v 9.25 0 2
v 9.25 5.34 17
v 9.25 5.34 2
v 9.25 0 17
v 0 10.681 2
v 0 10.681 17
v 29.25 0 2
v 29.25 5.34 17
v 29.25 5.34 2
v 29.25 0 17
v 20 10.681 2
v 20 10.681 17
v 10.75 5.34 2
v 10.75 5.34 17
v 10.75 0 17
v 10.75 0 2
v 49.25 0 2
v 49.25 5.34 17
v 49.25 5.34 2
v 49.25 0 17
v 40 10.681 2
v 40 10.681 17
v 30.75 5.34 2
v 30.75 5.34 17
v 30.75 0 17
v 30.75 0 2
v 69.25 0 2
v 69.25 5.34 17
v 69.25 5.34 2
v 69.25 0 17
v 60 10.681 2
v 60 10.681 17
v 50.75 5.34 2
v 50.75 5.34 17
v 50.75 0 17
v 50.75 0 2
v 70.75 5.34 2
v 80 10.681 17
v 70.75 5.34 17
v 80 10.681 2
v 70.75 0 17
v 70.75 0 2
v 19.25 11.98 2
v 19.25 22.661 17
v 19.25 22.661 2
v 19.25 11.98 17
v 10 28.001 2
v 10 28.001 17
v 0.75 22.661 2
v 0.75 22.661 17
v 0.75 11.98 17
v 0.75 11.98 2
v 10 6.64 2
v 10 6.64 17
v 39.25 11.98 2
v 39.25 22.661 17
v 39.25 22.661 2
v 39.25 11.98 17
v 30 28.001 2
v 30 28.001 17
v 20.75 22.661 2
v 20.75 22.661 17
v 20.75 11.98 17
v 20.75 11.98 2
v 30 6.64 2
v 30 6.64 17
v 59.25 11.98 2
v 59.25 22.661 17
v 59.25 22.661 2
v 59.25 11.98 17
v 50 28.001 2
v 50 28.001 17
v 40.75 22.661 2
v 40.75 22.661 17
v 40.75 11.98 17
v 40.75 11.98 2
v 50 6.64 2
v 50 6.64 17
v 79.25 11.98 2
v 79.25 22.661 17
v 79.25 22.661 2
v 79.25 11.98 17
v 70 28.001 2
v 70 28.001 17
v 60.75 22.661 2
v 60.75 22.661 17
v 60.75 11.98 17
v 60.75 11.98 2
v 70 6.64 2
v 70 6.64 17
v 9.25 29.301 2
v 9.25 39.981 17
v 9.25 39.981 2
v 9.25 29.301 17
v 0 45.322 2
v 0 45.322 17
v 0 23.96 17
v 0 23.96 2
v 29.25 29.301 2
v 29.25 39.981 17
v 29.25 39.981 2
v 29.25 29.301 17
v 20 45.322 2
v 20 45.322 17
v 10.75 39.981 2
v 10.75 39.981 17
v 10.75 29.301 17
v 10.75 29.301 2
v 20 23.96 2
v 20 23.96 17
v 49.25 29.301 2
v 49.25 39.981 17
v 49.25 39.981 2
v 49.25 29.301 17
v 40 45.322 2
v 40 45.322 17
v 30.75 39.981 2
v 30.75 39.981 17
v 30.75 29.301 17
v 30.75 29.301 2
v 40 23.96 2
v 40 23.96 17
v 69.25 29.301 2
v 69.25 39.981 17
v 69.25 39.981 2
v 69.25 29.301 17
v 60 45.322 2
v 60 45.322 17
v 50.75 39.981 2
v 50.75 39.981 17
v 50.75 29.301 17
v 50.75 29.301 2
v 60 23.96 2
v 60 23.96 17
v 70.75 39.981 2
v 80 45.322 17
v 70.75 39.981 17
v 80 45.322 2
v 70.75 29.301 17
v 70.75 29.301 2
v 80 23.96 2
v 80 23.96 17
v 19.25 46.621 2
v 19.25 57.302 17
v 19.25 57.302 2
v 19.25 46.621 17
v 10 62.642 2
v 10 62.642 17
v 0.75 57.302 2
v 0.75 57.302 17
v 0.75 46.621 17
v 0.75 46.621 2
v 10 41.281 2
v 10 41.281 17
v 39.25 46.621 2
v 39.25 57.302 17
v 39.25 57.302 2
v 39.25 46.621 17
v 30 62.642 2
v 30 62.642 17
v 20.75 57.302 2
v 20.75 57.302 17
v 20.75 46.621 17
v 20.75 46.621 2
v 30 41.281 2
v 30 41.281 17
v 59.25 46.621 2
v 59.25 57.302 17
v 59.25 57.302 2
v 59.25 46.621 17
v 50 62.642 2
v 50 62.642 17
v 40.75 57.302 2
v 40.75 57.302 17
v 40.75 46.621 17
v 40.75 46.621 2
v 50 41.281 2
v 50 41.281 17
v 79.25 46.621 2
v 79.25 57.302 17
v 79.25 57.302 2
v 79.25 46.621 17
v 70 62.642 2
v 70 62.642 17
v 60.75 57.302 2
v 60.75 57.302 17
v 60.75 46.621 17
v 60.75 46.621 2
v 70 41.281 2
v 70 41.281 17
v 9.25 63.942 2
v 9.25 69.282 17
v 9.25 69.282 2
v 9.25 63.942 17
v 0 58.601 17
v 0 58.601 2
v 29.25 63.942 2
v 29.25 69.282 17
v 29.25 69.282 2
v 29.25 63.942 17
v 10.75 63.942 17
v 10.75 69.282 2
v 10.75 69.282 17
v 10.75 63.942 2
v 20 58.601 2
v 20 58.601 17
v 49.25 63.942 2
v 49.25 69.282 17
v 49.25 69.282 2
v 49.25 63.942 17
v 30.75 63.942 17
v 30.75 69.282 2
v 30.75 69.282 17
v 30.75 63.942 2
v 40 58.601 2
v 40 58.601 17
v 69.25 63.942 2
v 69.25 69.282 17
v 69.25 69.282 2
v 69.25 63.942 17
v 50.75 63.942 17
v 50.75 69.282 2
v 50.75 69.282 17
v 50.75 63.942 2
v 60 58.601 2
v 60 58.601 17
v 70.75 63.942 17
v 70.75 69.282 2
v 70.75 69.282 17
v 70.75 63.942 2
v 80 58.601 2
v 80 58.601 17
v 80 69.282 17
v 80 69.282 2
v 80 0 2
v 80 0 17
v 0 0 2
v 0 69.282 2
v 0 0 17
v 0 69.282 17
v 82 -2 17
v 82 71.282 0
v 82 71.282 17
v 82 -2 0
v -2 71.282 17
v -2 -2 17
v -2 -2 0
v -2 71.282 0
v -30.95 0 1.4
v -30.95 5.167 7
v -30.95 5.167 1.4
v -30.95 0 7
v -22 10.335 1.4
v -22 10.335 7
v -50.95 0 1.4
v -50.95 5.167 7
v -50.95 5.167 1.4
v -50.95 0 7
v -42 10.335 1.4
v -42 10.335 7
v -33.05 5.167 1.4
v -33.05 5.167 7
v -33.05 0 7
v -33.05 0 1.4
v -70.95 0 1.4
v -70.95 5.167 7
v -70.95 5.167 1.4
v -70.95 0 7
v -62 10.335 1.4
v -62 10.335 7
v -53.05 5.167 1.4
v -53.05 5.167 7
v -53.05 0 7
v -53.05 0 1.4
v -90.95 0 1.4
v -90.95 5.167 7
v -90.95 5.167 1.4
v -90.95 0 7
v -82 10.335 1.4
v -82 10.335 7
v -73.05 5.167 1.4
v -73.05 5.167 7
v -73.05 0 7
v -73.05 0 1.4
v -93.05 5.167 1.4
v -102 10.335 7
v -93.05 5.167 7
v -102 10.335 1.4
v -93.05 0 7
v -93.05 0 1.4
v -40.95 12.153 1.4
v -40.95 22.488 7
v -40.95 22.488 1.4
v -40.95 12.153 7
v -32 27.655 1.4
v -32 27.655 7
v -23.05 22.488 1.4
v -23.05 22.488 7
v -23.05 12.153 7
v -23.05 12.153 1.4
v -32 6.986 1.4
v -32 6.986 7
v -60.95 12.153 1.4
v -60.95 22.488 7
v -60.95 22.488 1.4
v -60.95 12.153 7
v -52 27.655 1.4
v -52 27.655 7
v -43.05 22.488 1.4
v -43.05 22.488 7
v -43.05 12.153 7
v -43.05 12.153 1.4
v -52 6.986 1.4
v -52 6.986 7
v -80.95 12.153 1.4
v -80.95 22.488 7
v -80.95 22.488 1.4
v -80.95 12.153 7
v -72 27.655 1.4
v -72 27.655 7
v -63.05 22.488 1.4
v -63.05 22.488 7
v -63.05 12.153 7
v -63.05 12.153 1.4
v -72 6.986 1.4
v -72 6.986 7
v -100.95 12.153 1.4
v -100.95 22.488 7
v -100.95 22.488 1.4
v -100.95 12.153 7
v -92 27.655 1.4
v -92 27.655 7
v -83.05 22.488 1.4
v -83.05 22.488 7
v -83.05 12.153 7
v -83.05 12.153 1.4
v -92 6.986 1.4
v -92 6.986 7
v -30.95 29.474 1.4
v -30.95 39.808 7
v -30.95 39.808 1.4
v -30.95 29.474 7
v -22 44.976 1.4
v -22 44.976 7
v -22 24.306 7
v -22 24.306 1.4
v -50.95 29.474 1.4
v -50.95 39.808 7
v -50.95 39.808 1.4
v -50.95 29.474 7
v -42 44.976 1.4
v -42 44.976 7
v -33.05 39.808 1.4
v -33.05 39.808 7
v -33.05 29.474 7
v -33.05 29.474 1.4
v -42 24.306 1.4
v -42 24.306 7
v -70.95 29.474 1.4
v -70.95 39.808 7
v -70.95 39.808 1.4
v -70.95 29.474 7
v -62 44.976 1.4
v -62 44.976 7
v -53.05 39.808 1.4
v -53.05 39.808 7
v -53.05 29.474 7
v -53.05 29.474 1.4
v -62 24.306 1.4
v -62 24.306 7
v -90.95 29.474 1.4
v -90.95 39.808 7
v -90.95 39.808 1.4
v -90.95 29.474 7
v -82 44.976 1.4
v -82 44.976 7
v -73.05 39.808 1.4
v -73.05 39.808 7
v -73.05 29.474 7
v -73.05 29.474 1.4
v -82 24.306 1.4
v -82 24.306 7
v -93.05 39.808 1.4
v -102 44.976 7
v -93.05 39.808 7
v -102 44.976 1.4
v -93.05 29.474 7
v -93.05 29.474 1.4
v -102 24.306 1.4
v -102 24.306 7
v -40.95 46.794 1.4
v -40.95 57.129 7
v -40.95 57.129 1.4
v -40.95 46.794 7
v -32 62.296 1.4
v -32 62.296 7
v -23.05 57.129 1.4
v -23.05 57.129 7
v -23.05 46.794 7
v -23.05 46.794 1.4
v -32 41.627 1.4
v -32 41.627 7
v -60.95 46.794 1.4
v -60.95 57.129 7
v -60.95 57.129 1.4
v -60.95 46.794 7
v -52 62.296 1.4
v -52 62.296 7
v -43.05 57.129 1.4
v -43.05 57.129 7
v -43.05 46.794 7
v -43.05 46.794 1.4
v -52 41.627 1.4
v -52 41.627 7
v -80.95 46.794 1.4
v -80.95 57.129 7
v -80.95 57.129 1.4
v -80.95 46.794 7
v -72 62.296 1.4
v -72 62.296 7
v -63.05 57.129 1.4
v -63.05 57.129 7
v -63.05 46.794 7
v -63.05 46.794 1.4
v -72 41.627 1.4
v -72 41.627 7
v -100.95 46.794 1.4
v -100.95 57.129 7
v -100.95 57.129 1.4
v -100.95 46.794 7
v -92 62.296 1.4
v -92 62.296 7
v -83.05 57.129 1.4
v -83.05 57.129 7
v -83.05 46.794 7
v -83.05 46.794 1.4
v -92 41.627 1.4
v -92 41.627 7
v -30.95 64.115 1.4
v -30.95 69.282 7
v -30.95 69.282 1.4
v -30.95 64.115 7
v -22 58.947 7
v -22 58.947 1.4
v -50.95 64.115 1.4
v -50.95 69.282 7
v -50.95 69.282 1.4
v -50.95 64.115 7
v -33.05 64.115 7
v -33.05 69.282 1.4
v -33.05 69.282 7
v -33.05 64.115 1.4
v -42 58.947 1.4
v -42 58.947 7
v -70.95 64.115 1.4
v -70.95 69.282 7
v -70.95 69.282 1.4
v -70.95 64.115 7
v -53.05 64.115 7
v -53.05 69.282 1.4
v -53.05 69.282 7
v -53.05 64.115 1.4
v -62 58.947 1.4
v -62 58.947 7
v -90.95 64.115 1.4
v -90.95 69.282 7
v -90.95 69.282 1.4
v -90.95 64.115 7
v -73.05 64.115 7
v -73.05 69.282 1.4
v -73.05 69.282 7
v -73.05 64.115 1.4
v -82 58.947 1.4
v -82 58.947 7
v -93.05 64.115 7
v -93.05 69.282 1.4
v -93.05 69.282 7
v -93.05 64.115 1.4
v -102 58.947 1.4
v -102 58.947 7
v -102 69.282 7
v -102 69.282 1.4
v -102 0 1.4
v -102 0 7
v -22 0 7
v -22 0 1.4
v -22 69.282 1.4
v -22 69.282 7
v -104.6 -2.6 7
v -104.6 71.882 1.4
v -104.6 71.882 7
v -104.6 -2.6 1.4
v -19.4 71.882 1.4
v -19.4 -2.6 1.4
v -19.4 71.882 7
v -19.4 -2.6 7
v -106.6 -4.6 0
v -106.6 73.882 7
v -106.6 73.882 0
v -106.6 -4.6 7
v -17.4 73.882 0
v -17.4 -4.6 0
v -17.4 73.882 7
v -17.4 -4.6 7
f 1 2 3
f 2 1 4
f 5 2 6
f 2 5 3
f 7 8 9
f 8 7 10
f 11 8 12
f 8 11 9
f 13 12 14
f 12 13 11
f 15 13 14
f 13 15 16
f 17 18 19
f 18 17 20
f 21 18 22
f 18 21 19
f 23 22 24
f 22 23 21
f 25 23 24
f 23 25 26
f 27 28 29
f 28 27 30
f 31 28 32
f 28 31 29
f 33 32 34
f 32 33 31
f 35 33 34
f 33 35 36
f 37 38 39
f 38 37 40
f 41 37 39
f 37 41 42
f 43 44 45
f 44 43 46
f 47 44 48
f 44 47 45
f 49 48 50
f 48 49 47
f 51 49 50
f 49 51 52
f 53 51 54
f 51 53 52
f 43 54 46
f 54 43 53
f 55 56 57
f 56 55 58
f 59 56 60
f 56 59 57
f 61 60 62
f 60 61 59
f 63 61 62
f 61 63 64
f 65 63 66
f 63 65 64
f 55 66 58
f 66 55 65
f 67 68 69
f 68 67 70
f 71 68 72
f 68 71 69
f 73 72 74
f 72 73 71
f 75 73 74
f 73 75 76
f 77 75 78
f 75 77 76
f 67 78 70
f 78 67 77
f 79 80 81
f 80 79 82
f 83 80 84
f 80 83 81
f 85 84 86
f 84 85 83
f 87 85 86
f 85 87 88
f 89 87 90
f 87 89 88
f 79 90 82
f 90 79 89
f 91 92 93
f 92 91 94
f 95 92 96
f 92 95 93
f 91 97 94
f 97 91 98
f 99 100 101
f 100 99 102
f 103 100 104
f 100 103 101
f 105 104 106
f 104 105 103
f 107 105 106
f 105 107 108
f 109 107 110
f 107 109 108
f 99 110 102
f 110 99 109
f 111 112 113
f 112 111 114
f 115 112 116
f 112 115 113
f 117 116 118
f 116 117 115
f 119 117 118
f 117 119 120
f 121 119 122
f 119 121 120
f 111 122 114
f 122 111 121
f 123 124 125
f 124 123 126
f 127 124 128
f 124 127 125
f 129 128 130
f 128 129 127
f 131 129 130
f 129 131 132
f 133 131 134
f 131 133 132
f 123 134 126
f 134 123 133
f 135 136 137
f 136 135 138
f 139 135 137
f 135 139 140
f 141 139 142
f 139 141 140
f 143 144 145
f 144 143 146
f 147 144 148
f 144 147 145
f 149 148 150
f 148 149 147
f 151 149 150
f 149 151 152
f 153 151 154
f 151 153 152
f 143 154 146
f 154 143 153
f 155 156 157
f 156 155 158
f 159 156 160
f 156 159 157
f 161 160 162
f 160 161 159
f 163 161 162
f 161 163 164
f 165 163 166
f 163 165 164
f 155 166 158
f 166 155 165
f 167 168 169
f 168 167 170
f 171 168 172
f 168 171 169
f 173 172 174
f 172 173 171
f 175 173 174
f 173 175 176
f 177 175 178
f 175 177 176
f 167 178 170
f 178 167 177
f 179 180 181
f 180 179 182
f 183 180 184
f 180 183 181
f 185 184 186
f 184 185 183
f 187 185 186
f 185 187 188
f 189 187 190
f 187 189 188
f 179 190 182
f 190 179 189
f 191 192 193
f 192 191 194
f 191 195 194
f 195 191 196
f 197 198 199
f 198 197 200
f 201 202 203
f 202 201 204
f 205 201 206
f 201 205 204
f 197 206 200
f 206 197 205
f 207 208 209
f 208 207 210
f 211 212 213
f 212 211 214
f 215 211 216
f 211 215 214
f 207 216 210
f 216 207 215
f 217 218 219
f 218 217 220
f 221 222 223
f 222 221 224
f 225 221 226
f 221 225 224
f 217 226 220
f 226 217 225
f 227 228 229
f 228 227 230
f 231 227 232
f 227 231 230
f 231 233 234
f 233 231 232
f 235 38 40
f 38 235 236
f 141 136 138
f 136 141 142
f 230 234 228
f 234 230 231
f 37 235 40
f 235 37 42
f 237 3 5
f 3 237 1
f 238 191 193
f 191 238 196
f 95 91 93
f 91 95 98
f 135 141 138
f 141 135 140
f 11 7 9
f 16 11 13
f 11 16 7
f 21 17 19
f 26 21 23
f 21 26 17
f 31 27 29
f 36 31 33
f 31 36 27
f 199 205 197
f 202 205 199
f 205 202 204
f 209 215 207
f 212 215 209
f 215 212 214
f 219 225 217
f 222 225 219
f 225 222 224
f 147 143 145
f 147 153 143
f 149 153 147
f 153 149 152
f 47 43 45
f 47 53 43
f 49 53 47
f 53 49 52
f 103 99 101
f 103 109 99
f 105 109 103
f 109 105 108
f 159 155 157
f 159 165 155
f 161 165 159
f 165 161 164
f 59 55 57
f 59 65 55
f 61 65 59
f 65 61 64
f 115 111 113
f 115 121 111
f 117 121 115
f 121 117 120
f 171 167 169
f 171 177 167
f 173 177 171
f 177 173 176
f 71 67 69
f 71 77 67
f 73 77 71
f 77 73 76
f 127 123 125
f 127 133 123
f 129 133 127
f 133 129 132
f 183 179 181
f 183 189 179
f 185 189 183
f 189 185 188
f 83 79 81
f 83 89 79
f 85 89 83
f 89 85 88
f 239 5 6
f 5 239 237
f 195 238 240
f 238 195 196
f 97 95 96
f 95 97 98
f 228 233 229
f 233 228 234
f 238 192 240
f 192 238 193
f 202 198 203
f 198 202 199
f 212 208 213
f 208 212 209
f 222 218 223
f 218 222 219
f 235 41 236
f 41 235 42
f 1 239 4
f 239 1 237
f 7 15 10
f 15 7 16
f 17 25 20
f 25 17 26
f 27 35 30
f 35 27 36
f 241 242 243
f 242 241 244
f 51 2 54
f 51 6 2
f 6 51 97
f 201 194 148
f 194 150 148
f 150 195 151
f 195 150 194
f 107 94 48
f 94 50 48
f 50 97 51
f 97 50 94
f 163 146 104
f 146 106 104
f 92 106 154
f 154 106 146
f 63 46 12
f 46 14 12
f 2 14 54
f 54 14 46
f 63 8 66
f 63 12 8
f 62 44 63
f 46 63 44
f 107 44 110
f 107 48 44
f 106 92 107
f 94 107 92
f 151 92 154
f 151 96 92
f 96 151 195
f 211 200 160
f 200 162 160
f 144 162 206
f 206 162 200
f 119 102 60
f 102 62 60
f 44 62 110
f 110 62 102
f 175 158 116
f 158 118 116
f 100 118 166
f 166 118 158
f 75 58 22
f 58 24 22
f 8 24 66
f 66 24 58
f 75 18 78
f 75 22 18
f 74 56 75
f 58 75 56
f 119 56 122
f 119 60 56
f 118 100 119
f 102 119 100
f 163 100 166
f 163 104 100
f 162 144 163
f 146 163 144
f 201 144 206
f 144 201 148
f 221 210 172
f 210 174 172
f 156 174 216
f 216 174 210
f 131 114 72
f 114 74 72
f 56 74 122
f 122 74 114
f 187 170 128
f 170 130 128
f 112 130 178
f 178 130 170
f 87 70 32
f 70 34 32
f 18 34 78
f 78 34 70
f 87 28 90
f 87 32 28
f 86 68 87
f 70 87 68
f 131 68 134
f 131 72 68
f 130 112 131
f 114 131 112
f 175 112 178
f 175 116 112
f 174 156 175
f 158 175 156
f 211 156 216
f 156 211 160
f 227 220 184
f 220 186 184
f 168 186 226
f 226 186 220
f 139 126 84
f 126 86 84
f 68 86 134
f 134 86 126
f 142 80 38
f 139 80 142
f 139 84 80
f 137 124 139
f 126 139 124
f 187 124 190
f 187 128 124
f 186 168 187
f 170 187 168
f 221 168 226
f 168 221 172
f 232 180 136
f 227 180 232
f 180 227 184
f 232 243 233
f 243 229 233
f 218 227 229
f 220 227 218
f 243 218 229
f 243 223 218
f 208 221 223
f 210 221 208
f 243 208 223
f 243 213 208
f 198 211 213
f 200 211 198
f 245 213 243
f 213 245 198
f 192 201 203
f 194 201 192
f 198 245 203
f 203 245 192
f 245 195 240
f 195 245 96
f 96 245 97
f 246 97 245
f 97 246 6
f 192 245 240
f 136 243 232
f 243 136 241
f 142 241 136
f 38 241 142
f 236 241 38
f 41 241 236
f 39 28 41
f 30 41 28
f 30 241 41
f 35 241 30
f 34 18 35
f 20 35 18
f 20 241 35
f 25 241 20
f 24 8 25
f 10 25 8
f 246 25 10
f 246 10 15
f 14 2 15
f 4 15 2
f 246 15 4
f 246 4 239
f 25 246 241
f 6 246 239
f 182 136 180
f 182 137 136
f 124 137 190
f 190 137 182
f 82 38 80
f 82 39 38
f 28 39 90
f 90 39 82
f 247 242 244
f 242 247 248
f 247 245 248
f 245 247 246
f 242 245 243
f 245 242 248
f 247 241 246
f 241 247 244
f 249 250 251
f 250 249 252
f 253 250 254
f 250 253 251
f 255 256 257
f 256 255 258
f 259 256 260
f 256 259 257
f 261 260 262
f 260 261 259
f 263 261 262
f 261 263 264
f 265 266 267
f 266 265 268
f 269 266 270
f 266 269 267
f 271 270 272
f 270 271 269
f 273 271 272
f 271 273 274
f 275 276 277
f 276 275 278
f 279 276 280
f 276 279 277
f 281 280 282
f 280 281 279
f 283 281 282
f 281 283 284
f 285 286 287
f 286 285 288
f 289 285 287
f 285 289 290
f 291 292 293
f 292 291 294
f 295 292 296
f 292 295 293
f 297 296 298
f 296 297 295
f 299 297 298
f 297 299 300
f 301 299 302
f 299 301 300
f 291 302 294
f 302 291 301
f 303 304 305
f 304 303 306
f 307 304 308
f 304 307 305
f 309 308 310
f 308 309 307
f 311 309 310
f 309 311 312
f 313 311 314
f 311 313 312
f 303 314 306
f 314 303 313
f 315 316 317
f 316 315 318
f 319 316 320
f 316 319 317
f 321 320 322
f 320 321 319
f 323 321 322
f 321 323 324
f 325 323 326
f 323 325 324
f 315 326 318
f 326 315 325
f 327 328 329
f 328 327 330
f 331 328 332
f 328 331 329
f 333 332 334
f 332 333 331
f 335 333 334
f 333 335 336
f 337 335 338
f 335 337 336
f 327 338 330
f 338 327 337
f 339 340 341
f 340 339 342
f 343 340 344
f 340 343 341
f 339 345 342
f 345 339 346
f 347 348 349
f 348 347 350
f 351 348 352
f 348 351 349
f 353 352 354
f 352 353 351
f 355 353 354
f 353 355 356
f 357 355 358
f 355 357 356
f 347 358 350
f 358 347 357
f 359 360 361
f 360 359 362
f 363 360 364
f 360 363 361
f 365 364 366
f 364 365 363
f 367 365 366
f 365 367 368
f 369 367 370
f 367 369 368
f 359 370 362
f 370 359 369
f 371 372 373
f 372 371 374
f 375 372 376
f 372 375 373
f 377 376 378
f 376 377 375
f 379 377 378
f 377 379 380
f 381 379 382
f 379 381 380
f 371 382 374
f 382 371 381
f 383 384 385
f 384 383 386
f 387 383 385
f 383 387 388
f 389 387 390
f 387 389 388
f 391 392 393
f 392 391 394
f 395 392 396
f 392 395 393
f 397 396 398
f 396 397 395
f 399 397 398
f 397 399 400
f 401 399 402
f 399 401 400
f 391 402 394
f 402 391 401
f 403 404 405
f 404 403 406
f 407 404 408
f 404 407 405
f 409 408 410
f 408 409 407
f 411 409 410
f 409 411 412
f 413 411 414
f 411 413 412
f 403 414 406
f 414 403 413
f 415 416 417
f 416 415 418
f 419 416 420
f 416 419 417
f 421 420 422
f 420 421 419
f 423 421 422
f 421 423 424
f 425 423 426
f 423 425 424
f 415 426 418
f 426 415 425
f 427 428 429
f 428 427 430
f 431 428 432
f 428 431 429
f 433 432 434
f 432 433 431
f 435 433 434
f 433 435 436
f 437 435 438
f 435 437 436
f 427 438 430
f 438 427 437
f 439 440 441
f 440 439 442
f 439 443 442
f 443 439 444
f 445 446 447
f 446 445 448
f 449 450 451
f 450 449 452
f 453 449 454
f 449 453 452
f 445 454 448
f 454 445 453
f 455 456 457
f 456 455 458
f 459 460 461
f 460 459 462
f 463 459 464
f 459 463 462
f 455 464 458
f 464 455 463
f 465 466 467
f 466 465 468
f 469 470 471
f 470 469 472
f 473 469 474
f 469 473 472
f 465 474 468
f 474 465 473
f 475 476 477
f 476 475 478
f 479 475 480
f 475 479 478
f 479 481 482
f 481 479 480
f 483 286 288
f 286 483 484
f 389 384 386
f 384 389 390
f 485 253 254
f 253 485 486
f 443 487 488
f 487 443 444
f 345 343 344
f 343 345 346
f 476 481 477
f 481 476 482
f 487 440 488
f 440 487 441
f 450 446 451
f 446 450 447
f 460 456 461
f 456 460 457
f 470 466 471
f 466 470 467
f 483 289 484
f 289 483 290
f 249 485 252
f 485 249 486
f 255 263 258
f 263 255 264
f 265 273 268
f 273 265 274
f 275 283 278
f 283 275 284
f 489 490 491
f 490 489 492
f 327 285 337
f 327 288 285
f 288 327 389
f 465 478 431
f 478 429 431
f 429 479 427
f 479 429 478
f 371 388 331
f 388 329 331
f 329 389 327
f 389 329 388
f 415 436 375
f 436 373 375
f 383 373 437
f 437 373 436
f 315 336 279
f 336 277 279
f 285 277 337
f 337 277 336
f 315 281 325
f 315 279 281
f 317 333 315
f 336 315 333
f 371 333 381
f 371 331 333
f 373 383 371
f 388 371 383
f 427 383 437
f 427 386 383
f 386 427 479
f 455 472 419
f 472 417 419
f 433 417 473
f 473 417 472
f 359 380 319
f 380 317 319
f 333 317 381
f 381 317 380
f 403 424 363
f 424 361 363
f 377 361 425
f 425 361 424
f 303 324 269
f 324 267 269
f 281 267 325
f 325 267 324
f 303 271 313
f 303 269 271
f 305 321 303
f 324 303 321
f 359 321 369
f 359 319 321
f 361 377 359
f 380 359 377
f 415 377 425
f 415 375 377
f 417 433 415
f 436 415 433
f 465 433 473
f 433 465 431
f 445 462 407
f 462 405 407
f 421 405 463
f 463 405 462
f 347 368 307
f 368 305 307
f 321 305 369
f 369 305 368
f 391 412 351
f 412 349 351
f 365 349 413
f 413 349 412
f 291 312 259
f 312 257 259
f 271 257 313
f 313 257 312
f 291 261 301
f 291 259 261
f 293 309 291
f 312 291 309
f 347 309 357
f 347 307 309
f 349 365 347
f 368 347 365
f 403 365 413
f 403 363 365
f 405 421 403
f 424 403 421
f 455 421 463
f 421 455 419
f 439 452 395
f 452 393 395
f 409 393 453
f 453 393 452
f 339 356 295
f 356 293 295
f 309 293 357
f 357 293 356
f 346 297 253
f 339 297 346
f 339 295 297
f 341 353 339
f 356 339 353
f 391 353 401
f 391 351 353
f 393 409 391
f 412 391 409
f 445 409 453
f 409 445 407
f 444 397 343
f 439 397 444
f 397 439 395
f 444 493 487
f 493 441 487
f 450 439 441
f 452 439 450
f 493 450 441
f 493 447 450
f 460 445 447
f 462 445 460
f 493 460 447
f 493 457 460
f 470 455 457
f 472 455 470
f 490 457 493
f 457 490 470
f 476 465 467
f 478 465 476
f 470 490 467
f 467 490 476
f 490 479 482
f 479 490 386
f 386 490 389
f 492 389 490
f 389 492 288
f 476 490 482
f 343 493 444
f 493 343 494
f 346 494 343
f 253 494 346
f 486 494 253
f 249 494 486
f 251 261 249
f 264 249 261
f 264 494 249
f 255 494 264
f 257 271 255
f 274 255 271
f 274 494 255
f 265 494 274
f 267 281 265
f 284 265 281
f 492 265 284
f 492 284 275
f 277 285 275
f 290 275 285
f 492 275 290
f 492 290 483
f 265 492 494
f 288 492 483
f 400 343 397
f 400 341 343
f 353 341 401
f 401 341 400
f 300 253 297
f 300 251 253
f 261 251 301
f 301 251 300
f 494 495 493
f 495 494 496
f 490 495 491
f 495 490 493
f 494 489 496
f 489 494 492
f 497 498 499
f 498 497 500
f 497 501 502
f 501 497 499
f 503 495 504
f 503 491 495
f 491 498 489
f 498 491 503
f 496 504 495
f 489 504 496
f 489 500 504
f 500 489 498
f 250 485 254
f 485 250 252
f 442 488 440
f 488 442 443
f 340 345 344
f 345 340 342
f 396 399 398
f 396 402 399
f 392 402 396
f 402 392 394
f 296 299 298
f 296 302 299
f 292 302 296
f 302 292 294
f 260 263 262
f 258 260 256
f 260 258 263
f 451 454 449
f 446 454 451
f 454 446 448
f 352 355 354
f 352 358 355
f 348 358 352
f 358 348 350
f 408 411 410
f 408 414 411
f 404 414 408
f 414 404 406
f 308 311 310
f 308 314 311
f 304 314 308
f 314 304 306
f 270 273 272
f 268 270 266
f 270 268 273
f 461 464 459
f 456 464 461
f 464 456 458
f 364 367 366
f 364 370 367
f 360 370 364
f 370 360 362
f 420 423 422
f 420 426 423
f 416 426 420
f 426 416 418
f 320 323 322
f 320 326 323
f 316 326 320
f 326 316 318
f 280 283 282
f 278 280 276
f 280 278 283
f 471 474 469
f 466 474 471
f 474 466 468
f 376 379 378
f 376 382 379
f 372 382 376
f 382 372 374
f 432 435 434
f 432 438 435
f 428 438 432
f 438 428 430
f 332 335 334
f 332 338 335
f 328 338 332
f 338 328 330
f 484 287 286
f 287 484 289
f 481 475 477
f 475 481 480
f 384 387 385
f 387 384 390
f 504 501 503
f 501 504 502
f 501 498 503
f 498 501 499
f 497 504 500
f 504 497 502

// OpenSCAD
// copyright misty soul 2012
// distributed under the terms of the
// CreativeCommons Attribution-ShareAlike 3.0 Unported (CC BY-SA 3.0)


// number of rows and columns, beware that some hexagonal cells are clipped
// at rectangular box boundaries, so the total number of cells will be
// smaller than rows * columns
rows          = 5;
columns       = 5;

// cell step is hole size between opposite hexagon walls plus inner wall thickness
cell_step     = 20;

// inner depth of the hexagonal boxes
height        = 15;

// walls thickness
inner_walls   = 1.5;
outer_walls   = 2;

// this clearance should allow fitting of the lid over the bottom box
lid_clearance = 0.6;

// how far does the lid protrube inside the bottom box
lid_depth     = 5;

module honeycomb_row(cells, cell_step, inner_walls, height) {
    translate([0, 0, -height/2])
    linear_extrude(height=height) {
        for (j = [0 : cells - 1]) {
            translate([j * cell_step, 0, 0]) rotate([0,0,30])
            circle(r=(cell_step - inner_walls)/sqrt(3),$fn=6);
        }
    }
}


module full_honeycomb(rows, columns, cell_step, inner_walls, height) {
    for (i = [0 : rows - 1]) {
        translate([(i % 2) * cell_step / 2, cell_step * i * sqrt(3) / 2, 0])
        honeycomb_row(columns, cell_step, inner_walls, height);
    }
}

module clipped_honeycomb(rows, columns, cell_step, inner_walls, height) {
    intersection() {
        cube([(columns - 1) * cell_step, (rows - 1) * cell_step * sqrt(3) / 2, height]);
        full_honeycomb(rows, columns, cell_step, inner_walls, 3 * height);
    }
}

module bottom_part(rows, columns, cell_step, inner_walls, outer_walls, height) {
    translate([0, 0, outer_walls])
    difference() {
        translate([-outer_walls, -outer_walls, -outer_walls])
        cube([(columns - 1) * cell_step + 2 * outer_walls,
              (rows - 1) * cell_step * sqrt(3) / 2 + 2 * outer_walls,
              height + outer_walls]);
        clipped_honeycomb(rows, columns, cell_step, inner_walls, 2 * height);
    }
}

module top_part(rows, columns, cell_step, inner_walls, outer_walls, height, lid_clearance) {
    translate([-(cell_step + outer_walls), 0, height + 2 * outer_walls])
    rotate([0,180,0])
    difference() {
        translate([-((2 * outer_walls) + lid_clearance),
                   -((2 * outer_walls) + lid_clearance),
                   height + outer_walls - lid_depth])
            cube([(columns - 1) * cell_step + 4 * outer_walls + 2 * lid_clearance,
                  (rows - 1) * cell_step * sqrt(3) / 2 + 4 * outer_walls + 2 * lid_clearance,
                  outer_walls + lid_depth]);
        bottom_part(rows,columns, cell_step, inner_walls + lid_clearance, outer_walls + lid_clearance, height);
    }
}

bottom_part(rows, columns, cell_step, inner_walls, outer_walls, height);

top_part(rows, columns, cell_step, inner_walls, outer_walls, height, lid_clearance);
